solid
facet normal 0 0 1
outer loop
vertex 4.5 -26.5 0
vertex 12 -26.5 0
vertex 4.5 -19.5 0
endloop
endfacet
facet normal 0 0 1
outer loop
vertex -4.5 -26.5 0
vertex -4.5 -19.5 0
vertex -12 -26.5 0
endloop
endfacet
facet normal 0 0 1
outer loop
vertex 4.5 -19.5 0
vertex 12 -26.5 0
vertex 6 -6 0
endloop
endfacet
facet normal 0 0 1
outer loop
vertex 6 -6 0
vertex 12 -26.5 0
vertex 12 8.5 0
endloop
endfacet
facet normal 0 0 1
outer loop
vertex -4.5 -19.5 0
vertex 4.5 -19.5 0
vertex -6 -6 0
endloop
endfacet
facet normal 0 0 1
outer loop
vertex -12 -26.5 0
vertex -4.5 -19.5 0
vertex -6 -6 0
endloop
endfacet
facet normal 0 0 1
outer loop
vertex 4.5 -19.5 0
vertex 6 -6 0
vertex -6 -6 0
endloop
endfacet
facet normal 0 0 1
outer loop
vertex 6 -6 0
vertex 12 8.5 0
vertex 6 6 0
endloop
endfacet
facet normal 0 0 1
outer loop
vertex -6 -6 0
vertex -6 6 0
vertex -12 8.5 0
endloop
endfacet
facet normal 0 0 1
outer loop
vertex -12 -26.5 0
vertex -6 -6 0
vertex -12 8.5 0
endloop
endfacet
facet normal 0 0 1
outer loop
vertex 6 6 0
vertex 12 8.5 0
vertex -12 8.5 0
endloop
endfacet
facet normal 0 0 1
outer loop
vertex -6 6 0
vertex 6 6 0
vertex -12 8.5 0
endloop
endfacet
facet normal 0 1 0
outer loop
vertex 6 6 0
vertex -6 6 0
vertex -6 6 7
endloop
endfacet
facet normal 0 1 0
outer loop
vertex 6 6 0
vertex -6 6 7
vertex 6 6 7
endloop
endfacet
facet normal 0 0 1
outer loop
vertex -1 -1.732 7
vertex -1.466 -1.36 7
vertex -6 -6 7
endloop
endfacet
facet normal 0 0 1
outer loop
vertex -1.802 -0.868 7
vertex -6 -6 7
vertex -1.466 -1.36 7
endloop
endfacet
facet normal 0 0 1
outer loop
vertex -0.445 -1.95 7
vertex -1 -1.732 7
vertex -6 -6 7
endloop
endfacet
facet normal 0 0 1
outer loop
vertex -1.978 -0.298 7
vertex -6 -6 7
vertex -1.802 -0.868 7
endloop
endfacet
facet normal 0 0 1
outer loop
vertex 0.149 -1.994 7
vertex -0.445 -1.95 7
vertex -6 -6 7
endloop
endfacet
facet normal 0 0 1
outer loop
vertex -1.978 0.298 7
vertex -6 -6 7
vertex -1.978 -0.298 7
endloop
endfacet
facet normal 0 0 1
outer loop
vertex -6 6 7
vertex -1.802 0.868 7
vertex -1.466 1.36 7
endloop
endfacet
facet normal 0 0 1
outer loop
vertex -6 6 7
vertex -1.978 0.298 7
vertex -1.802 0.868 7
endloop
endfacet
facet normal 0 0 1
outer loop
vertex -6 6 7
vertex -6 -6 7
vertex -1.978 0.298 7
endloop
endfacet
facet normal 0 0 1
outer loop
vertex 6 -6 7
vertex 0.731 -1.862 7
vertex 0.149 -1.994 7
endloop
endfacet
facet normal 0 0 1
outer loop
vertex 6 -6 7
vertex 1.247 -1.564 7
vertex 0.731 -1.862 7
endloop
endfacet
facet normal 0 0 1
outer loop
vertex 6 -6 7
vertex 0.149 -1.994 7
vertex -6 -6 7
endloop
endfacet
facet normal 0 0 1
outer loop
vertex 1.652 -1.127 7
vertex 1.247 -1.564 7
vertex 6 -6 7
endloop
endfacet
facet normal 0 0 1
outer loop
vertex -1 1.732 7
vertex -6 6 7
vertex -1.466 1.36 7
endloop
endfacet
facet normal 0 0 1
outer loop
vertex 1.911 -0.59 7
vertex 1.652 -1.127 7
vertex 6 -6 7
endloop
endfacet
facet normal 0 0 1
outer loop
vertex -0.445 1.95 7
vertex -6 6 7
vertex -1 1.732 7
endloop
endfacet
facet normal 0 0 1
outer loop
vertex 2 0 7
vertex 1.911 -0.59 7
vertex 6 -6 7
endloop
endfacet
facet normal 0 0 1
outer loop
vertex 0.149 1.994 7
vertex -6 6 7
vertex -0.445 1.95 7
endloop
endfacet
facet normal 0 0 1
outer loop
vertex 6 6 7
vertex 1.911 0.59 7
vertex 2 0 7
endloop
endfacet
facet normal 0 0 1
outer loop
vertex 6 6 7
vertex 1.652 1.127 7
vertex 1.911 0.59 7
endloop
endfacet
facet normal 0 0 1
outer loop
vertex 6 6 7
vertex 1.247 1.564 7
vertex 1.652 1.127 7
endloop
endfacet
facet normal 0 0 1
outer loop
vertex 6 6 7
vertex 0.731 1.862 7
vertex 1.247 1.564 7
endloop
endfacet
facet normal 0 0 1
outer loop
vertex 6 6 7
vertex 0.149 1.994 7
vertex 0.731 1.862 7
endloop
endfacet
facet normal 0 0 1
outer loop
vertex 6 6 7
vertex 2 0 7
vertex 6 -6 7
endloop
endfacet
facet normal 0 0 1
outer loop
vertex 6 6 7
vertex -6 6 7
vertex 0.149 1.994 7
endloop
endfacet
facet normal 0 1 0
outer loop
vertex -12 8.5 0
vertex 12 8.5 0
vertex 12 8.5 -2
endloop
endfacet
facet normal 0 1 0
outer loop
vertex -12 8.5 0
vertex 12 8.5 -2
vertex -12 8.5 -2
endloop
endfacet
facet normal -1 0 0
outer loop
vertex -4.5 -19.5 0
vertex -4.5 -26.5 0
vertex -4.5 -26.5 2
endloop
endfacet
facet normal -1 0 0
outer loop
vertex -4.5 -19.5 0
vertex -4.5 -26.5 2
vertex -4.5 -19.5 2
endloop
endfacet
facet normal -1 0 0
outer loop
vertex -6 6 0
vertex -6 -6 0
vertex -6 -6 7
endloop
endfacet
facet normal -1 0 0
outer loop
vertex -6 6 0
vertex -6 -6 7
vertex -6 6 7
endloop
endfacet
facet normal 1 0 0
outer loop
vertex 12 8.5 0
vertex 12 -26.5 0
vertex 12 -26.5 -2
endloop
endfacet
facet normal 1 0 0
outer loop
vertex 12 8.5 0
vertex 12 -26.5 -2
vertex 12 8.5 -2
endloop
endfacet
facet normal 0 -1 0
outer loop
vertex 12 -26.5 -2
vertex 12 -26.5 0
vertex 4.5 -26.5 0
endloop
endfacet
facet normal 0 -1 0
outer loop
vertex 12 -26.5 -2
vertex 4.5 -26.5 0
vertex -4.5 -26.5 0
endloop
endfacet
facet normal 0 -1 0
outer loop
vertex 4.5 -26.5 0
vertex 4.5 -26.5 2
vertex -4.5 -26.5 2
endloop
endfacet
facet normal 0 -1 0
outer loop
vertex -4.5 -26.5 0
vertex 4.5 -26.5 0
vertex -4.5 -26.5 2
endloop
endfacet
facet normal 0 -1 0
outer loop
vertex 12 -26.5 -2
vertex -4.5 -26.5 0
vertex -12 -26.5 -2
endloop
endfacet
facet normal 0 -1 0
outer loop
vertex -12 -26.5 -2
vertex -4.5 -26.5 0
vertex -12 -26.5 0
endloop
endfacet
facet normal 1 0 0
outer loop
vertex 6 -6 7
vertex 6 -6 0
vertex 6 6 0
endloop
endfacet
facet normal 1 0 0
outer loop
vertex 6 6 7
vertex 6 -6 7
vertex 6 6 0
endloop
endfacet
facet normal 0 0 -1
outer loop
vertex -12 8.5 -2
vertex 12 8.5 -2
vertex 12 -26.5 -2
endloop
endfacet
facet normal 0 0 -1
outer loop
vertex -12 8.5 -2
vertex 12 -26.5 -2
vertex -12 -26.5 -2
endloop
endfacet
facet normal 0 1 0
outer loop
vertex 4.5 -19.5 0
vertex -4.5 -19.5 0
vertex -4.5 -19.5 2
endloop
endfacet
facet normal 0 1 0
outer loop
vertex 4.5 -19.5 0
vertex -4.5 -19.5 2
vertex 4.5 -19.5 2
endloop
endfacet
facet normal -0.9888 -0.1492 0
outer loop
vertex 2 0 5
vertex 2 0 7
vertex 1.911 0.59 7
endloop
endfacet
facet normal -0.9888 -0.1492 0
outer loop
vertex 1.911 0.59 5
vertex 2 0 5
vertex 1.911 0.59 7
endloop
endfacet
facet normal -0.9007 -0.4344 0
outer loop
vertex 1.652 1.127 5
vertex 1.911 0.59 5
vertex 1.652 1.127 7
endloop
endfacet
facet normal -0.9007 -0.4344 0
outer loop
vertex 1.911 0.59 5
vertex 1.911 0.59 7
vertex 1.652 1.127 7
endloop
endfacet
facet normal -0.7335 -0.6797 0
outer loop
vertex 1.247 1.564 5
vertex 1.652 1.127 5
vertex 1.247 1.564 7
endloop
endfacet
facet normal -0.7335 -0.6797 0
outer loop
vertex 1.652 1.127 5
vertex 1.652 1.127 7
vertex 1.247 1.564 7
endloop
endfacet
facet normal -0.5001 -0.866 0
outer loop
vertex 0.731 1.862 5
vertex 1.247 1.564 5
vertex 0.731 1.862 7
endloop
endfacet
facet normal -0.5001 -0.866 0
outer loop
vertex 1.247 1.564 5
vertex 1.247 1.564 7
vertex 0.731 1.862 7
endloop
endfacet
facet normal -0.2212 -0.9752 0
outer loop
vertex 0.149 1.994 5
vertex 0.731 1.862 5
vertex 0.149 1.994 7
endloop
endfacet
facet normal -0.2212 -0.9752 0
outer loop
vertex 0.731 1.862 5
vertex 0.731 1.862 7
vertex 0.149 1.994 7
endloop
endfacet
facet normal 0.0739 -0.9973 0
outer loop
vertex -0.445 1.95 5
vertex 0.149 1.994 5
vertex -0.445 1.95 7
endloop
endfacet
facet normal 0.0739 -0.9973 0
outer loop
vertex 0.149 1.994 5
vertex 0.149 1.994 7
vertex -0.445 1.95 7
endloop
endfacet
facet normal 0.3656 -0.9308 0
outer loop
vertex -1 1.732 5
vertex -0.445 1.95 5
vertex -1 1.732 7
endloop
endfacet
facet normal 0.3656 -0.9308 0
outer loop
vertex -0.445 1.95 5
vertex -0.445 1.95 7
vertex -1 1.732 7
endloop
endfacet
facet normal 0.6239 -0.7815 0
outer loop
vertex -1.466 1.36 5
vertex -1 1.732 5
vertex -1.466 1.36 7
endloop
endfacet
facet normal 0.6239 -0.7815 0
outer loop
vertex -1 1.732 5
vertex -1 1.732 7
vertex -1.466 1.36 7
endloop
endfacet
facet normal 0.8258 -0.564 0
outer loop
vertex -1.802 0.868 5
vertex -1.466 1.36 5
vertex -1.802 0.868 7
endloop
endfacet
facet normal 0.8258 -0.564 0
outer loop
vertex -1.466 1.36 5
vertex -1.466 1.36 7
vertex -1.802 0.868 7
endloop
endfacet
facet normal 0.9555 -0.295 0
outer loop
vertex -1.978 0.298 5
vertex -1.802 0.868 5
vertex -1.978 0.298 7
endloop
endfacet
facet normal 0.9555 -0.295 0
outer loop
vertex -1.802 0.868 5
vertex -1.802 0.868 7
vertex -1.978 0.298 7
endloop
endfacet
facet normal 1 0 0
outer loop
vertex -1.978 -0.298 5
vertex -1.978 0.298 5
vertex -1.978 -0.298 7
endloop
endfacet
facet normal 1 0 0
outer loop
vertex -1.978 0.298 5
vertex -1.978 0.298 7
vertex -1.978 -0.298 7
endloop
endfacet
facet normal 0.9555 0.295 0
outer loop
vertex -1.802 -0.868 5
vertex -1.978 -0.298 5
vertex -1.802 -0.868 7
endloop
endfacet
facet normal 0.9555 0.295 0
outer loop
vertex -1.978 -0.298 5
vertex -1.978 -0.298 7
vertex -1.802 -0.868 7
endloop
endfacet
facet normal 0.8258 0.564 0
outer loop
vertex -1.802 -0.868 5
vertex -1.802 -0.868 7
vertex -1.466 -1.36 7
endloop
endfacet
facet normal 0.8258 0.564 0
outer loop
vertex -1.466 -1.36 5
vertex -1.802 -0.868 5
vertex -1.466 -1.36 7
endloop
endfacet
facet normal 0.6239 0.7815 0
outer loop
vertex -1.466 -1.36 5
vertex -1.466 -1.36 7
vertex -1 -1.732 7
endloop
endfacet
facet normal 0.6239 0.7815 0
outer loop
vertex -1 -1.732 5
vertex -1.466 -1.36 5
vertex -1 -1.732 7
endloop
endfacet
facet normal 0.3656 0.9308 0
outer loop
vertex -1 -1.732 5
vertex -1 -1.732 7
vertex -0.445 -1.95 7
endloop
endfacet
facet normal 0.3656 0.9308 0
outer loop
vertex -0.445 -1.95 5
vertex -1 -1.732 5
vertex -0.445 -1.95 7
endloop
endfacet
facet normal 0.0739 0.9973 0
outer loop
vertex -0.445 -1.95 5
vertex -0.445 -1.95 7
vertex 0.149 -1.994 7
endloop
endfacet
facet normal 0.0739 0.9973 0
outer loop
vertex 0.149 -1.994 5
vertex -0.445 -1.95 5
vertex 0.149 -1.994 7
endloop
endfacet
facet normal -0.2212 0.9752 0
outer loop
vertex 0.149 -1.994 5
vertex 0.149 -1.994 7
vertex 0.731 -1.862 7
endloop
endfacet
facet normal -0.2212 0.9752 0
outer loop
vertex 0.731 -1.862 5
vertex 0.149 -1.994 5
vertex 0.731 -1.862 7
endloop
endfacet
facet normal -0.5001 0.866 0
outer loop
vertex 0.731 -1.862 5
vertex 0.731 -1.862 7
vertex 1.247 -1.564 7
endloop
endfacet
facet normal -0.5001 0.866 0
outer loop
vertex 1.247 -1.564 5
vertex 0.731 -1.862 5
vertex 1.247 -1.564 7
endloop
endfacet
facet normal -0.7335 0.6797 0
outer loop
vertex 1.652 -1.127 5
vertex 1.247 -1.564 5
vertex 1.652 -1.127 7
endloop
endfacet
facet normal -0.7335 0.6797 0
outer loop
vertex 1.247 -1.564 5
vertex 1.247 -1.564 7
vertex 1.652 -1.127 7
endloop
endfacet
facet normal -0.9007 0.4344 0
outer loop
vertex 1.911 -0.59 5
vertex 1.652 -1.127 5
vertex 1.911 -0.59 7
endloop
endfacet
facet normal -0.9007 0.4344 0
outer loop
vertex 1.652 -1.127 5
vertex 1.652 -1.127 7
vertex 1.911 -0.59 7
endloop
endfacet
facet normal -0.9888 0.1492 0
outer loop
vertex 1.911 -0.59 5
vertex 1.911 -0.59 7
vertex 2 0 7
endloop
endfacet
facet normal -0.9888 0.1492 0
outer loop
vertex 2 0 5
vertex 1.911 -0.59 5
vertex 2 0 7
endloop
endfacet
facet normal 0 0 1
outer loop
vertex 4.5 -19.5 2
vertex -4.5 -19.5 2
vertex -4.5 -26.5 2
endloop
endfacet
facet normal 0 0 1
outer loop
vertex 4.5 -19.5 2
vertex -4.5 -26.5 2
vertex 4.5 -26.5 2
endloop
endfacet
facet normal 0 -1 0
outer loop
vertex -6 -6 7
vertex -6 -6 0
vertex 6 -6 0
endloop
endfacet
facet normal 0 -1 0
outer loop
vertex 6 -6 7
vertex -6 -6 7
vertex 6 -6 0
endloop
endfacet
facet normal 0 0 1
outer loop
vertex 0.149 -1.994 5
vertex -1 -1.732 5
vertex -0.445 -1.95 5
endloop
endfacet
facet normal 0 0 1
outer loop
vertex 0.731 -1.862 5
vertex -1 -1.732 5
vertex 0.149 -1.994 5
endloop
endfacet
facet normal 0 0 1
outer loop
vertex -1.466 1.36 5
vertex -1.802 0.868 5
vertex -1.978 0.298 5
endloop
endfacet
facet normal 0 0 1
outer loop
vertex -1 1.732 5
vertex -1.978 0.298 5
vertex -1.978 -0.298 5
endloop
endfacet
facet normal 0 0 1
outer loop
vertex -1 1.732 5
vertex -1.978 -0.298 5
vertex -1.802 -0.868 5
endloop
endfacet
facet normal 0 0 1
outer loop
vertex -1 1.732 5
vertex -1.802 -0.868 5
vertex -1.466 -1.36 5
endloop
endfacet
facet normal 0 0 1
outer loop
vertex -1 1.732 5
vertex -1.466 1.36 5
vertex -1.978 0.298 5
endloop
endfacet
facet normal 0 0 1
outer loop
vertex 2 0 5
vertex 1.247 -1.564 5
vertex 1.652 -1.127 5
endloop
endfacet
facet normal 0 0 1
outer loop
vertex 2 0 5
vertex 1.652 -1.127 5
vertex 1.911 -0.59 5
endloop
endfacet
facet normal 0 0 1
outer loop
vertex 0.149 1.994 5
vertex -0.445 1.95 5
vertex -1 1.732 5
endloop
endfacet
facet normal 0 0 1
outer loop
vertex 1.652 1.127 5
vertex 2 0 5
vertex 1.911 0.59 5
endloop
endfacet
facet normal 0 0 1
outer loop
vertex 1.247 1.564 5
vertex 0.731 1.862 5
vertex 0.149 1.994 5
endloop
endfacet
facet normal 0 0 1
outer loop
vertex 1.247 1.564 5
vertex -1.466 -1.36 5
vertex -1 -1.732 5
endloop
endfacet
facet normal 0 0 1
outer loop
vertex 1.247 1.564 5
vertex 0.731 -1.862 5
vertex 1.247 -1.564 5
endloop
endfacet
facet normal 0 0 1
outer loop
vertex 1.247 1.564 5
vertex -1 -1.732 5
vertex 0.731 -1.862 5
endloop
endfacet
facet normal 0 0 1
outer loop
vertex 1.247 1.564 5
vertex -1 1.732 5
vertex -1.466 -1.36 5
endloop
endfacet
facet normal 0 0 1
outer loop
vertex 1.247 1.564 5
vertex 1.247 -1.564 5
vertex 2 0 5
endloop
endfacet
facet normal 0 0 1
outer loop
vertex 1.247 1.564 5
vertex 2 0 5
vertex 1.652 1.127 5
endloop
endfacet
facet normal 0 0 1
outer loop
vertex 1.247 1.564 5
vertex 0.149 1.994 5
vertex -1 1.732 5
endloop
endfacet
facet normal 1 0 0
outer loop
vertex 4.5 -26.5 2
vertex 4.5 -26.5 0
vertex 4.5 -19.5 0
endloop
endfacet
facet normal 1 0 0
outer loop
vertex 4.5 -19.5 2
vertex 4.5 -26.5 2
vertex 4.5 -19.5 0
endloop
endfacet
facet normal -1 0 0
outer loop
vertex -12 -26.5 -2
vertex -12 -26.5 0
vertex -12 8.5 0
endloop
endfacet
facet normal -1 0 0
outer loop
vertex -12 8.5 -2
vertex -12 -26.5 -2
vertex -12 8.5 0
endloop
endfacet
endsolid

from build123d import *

# Parameters (mm, degrees)
SKETCH_1_W          = 12
SKETCH_1_H          = 12
EXTRUDE_1_DEPTH     = 7
SKETCH_2_W          = 24
SKETCH_2_H          = 35
EXTRUDE_2_DEPTH     = 2
SKETCH_3_W          = 9
SKETCH_3_H          = 7
EXTRUDE_3_DEPTH     = 2
SKETCH_4_R          = 2
CUT_EXTRUDE_1_DEPTH = 2


with BuildPart() as part:
    # 스케치1 → 보스-돌출1 (new body)
    with BuildSketch(Plane.XY):
        Rectangle(SKETCH_1_W, SKETCH_1_H)
    extrude(amount=EXTRUDE_1_DEPTH)

    # 스케치2 → 보스-돌출2 (add)
    with BuildSketch(Plane(origin=(0, 0, 0), x_dir=(-1, 0, 0), z_dir=(0, 0, -1))):
        with Locations((0, -9)):
            Rectangle(SKETCH_2_W, SKETCH_2_H)
    extrude(amount=EXTRUDE_2_DEPTH)

    # 스케치3 → 보스-돌출3 (add)
    with BuildSketch(Plane.XY):
        with Locations((0, -23)):
            Rectangle(SKETCH_3_W, SKETCH_3_H)
    extrude(amount=EXTRUDE_3_DEPTH)

    # 스케치4 → 컷-돌출1 (cut)
    with BuildSketch(Plane.XY.offset(7)):
        Circle(SKETCH_4_R)
    extrude(amount=-CUT_EXTRUDE_1_DEPTH, mode=Mode.SUBTRACT)


solid = part.part
